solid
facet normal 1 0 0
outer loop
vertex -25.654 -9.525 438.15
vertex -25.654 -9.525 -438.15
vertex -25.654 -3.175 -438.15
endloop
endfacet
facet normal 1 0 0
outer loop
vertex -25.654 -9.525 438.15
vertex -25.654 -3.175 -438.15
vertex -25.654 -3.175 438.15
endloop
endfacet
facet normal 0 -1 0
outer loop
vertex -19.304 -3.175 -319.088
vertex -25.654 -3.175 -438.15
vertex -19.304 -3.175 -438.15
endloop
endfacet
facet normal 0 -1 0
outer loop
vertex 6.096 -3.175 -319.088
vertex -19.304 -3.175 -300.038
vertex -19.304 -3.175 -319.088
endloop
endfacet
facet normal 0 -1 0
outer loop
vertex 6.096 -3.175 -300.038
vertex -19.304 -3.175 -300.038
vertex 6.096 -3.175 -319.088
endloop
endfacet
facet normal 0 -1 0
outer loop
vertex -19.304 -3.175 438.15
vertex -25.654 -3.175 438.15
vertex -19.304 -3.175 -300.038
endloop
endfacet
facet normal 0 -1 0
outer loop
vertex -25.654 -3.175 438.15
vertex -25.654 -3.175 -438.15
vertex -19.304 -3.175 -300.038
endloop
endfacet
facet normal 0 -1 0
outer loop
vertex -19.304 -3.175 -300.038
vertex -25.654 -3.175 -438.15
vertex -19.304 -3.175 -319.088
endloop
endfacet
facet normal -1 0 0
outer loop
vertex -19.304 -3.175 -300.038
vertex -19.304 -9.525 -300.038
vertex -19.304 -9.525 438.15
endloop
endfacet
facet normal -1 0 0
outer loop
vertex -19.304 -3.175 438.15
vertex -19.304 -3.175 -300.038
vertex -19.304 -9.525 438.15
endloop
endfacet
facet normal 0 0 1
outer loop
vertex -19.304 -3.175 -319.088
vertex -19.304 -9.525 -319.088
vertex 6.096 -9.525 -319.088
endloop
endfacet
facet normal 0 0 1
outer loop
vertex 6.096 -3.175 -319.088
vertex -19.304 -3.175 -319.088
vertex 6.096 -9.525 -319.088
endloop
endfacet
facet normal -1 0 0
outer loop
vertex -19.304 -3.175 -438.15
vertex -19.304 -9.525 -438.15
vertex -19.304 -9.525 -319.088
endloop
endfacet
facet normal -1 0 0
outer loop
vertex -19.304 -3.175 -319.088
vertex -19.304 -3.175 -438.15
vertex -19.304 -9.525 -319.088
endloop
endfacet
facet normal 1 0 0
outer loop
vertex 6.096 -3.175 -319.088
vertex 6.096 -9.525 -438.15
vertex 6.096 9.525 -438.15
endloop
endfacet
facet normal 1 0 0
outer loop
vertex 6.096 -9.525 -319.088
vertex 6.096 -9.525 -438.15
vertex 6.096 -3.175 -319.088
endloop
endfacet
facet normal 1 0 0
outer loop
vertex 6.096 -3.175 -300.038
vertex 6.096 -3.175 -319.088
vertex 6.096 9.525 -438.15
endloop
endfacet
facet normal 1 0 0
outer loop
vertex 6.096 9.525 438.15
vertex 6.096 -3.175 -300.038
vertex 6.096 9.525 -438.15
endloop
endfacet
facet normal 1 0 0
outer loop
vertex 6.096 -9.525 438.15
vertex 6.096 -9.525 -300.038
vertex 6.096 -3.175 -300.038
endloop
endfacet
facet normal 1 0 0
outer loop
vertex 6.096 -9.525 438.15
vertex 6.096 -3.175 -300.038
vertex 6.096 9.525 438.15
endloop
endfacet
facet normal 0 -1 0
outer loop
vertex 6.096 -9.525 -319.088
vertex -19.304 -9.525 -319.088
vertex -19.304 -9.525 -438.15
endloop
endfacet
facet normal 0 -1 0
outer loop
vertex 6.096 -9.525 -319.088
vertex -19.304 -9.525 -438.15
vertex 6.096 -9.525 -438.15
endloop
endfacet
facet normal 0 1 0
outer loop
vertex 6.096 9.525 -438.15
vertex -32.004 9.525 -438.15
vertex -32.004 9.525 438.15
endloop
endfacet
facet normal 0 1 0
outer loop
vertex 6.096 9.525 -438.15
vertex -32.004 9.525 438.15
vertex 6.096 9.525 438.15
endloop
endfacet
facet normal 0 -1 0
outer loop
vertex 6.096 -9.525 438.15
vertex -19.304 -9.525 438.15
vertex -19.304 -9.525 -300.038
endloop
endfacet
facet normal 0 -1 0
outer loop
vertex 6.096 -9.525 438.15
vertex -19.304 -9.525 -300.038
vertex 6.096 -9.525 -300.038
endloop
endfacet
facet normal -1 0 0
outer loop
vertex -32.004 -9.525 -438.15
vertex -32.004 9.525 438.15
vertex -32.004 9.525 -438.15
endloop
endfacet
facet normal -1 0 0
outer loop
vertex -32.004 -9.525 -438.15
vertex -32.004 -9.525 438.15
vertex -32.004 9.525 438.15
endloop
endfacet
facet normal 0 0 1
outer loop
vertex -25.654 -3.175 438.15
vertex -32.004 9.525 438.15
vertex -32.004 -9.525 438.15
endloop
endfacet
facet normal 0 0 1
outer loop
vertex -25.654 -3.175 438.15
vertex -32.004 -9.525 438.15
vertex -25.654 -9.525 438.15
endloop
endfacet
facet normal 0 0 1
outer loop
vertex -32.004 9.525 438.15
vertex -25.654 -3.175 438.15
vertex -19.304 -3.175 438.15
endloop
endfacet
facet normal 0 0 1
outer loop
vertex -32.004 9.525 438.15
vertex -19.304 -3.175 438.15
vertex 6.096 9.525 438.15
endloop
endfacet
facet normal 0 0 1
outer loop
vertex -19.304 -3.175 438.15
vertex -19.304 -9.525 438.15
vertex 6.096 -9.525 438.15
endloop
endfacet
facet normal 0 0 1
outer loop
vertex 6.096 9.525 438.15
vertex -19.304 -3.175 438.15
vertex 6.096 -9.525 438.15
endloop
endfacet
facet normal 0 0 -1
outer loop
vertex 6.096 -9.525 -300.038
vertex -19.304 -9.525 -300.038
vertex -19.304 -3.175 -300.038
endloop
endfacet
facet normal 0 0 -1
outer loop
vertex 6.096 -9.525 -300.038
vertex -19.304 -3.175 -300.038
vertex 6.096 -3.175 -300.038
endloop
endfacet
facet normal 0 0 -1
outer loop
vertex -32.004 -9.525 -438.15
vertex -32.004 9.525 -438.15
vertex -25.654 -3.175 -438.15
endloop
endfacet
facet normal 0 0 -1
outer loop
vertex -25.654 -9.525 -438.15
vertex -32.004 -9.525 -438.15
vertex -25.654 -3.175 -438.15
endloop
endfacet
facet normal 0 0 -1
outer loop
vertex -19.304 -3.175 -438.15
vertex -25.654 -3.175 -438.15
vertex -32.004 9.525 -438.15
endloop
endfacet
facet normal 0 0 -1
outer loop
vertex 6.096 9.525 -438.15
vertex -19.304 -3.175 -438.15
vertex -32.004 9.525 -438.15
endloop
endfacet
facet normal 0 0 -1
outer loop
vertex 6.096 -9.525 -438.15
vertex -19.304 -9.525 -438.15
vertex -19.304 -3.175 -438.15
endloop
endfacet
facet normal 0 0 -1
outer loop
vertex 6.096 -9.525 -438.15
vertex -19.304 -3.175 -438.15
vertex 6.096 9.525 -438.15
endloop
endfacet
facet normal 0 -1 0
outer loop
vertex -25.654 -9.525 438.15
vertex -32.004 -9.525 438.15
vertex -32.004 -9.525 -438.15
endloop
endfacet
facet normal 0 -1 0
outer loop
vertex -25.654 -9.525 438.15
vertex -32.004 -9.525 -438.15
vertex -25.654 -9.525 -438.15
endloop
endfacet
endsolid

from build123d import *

# Parameters (mm, degrees)
F0_W     = 38.1
F0_H     = 438.15
F1_DEPTH = 9.525
F2_W     = 6.35
F2_H     = 876.3
F3_DEPTH = 6.35
F5_W     = 25.4
F5_H     = 19.05
F6_DEPTH = 6.35


with BuildPart() as f1:
    # F0 (on Front) → F1 (new body, symmetric)
    with BuildSketch(Plane.XZ):
        with Locations((-12.9539953259, 219.075)):
            Rectangle(F0_W, F0_H)
        with Locations((-12.9539953259, -219.075)):
            Rectangle(F0_W, F0_H)
    extrude(amount=F1_DEPTH, both=True)

    # F2 (on face) → F3 (cut)
    with BuildSketch(Plane.XZ.offset(9.525)):
        with Locations((-22.4789953259, 0)):
            Rectangle(F2_W, F2_H)
    extrude(amount=-F3_DEPTH, mode=Mode.SUBTRACT)

    # F5 (on face) → F6 (cut)
    with BuildSketch(Plane.XZ.offset(9.525)):
        with Locations((-6.6039953259, -309.5625)):
            Rectangle(F5_W, F5_H)
    extrude(amount=-F6_DEPTH, mode=Mode.SUBTRACT)


solid = f1.part
